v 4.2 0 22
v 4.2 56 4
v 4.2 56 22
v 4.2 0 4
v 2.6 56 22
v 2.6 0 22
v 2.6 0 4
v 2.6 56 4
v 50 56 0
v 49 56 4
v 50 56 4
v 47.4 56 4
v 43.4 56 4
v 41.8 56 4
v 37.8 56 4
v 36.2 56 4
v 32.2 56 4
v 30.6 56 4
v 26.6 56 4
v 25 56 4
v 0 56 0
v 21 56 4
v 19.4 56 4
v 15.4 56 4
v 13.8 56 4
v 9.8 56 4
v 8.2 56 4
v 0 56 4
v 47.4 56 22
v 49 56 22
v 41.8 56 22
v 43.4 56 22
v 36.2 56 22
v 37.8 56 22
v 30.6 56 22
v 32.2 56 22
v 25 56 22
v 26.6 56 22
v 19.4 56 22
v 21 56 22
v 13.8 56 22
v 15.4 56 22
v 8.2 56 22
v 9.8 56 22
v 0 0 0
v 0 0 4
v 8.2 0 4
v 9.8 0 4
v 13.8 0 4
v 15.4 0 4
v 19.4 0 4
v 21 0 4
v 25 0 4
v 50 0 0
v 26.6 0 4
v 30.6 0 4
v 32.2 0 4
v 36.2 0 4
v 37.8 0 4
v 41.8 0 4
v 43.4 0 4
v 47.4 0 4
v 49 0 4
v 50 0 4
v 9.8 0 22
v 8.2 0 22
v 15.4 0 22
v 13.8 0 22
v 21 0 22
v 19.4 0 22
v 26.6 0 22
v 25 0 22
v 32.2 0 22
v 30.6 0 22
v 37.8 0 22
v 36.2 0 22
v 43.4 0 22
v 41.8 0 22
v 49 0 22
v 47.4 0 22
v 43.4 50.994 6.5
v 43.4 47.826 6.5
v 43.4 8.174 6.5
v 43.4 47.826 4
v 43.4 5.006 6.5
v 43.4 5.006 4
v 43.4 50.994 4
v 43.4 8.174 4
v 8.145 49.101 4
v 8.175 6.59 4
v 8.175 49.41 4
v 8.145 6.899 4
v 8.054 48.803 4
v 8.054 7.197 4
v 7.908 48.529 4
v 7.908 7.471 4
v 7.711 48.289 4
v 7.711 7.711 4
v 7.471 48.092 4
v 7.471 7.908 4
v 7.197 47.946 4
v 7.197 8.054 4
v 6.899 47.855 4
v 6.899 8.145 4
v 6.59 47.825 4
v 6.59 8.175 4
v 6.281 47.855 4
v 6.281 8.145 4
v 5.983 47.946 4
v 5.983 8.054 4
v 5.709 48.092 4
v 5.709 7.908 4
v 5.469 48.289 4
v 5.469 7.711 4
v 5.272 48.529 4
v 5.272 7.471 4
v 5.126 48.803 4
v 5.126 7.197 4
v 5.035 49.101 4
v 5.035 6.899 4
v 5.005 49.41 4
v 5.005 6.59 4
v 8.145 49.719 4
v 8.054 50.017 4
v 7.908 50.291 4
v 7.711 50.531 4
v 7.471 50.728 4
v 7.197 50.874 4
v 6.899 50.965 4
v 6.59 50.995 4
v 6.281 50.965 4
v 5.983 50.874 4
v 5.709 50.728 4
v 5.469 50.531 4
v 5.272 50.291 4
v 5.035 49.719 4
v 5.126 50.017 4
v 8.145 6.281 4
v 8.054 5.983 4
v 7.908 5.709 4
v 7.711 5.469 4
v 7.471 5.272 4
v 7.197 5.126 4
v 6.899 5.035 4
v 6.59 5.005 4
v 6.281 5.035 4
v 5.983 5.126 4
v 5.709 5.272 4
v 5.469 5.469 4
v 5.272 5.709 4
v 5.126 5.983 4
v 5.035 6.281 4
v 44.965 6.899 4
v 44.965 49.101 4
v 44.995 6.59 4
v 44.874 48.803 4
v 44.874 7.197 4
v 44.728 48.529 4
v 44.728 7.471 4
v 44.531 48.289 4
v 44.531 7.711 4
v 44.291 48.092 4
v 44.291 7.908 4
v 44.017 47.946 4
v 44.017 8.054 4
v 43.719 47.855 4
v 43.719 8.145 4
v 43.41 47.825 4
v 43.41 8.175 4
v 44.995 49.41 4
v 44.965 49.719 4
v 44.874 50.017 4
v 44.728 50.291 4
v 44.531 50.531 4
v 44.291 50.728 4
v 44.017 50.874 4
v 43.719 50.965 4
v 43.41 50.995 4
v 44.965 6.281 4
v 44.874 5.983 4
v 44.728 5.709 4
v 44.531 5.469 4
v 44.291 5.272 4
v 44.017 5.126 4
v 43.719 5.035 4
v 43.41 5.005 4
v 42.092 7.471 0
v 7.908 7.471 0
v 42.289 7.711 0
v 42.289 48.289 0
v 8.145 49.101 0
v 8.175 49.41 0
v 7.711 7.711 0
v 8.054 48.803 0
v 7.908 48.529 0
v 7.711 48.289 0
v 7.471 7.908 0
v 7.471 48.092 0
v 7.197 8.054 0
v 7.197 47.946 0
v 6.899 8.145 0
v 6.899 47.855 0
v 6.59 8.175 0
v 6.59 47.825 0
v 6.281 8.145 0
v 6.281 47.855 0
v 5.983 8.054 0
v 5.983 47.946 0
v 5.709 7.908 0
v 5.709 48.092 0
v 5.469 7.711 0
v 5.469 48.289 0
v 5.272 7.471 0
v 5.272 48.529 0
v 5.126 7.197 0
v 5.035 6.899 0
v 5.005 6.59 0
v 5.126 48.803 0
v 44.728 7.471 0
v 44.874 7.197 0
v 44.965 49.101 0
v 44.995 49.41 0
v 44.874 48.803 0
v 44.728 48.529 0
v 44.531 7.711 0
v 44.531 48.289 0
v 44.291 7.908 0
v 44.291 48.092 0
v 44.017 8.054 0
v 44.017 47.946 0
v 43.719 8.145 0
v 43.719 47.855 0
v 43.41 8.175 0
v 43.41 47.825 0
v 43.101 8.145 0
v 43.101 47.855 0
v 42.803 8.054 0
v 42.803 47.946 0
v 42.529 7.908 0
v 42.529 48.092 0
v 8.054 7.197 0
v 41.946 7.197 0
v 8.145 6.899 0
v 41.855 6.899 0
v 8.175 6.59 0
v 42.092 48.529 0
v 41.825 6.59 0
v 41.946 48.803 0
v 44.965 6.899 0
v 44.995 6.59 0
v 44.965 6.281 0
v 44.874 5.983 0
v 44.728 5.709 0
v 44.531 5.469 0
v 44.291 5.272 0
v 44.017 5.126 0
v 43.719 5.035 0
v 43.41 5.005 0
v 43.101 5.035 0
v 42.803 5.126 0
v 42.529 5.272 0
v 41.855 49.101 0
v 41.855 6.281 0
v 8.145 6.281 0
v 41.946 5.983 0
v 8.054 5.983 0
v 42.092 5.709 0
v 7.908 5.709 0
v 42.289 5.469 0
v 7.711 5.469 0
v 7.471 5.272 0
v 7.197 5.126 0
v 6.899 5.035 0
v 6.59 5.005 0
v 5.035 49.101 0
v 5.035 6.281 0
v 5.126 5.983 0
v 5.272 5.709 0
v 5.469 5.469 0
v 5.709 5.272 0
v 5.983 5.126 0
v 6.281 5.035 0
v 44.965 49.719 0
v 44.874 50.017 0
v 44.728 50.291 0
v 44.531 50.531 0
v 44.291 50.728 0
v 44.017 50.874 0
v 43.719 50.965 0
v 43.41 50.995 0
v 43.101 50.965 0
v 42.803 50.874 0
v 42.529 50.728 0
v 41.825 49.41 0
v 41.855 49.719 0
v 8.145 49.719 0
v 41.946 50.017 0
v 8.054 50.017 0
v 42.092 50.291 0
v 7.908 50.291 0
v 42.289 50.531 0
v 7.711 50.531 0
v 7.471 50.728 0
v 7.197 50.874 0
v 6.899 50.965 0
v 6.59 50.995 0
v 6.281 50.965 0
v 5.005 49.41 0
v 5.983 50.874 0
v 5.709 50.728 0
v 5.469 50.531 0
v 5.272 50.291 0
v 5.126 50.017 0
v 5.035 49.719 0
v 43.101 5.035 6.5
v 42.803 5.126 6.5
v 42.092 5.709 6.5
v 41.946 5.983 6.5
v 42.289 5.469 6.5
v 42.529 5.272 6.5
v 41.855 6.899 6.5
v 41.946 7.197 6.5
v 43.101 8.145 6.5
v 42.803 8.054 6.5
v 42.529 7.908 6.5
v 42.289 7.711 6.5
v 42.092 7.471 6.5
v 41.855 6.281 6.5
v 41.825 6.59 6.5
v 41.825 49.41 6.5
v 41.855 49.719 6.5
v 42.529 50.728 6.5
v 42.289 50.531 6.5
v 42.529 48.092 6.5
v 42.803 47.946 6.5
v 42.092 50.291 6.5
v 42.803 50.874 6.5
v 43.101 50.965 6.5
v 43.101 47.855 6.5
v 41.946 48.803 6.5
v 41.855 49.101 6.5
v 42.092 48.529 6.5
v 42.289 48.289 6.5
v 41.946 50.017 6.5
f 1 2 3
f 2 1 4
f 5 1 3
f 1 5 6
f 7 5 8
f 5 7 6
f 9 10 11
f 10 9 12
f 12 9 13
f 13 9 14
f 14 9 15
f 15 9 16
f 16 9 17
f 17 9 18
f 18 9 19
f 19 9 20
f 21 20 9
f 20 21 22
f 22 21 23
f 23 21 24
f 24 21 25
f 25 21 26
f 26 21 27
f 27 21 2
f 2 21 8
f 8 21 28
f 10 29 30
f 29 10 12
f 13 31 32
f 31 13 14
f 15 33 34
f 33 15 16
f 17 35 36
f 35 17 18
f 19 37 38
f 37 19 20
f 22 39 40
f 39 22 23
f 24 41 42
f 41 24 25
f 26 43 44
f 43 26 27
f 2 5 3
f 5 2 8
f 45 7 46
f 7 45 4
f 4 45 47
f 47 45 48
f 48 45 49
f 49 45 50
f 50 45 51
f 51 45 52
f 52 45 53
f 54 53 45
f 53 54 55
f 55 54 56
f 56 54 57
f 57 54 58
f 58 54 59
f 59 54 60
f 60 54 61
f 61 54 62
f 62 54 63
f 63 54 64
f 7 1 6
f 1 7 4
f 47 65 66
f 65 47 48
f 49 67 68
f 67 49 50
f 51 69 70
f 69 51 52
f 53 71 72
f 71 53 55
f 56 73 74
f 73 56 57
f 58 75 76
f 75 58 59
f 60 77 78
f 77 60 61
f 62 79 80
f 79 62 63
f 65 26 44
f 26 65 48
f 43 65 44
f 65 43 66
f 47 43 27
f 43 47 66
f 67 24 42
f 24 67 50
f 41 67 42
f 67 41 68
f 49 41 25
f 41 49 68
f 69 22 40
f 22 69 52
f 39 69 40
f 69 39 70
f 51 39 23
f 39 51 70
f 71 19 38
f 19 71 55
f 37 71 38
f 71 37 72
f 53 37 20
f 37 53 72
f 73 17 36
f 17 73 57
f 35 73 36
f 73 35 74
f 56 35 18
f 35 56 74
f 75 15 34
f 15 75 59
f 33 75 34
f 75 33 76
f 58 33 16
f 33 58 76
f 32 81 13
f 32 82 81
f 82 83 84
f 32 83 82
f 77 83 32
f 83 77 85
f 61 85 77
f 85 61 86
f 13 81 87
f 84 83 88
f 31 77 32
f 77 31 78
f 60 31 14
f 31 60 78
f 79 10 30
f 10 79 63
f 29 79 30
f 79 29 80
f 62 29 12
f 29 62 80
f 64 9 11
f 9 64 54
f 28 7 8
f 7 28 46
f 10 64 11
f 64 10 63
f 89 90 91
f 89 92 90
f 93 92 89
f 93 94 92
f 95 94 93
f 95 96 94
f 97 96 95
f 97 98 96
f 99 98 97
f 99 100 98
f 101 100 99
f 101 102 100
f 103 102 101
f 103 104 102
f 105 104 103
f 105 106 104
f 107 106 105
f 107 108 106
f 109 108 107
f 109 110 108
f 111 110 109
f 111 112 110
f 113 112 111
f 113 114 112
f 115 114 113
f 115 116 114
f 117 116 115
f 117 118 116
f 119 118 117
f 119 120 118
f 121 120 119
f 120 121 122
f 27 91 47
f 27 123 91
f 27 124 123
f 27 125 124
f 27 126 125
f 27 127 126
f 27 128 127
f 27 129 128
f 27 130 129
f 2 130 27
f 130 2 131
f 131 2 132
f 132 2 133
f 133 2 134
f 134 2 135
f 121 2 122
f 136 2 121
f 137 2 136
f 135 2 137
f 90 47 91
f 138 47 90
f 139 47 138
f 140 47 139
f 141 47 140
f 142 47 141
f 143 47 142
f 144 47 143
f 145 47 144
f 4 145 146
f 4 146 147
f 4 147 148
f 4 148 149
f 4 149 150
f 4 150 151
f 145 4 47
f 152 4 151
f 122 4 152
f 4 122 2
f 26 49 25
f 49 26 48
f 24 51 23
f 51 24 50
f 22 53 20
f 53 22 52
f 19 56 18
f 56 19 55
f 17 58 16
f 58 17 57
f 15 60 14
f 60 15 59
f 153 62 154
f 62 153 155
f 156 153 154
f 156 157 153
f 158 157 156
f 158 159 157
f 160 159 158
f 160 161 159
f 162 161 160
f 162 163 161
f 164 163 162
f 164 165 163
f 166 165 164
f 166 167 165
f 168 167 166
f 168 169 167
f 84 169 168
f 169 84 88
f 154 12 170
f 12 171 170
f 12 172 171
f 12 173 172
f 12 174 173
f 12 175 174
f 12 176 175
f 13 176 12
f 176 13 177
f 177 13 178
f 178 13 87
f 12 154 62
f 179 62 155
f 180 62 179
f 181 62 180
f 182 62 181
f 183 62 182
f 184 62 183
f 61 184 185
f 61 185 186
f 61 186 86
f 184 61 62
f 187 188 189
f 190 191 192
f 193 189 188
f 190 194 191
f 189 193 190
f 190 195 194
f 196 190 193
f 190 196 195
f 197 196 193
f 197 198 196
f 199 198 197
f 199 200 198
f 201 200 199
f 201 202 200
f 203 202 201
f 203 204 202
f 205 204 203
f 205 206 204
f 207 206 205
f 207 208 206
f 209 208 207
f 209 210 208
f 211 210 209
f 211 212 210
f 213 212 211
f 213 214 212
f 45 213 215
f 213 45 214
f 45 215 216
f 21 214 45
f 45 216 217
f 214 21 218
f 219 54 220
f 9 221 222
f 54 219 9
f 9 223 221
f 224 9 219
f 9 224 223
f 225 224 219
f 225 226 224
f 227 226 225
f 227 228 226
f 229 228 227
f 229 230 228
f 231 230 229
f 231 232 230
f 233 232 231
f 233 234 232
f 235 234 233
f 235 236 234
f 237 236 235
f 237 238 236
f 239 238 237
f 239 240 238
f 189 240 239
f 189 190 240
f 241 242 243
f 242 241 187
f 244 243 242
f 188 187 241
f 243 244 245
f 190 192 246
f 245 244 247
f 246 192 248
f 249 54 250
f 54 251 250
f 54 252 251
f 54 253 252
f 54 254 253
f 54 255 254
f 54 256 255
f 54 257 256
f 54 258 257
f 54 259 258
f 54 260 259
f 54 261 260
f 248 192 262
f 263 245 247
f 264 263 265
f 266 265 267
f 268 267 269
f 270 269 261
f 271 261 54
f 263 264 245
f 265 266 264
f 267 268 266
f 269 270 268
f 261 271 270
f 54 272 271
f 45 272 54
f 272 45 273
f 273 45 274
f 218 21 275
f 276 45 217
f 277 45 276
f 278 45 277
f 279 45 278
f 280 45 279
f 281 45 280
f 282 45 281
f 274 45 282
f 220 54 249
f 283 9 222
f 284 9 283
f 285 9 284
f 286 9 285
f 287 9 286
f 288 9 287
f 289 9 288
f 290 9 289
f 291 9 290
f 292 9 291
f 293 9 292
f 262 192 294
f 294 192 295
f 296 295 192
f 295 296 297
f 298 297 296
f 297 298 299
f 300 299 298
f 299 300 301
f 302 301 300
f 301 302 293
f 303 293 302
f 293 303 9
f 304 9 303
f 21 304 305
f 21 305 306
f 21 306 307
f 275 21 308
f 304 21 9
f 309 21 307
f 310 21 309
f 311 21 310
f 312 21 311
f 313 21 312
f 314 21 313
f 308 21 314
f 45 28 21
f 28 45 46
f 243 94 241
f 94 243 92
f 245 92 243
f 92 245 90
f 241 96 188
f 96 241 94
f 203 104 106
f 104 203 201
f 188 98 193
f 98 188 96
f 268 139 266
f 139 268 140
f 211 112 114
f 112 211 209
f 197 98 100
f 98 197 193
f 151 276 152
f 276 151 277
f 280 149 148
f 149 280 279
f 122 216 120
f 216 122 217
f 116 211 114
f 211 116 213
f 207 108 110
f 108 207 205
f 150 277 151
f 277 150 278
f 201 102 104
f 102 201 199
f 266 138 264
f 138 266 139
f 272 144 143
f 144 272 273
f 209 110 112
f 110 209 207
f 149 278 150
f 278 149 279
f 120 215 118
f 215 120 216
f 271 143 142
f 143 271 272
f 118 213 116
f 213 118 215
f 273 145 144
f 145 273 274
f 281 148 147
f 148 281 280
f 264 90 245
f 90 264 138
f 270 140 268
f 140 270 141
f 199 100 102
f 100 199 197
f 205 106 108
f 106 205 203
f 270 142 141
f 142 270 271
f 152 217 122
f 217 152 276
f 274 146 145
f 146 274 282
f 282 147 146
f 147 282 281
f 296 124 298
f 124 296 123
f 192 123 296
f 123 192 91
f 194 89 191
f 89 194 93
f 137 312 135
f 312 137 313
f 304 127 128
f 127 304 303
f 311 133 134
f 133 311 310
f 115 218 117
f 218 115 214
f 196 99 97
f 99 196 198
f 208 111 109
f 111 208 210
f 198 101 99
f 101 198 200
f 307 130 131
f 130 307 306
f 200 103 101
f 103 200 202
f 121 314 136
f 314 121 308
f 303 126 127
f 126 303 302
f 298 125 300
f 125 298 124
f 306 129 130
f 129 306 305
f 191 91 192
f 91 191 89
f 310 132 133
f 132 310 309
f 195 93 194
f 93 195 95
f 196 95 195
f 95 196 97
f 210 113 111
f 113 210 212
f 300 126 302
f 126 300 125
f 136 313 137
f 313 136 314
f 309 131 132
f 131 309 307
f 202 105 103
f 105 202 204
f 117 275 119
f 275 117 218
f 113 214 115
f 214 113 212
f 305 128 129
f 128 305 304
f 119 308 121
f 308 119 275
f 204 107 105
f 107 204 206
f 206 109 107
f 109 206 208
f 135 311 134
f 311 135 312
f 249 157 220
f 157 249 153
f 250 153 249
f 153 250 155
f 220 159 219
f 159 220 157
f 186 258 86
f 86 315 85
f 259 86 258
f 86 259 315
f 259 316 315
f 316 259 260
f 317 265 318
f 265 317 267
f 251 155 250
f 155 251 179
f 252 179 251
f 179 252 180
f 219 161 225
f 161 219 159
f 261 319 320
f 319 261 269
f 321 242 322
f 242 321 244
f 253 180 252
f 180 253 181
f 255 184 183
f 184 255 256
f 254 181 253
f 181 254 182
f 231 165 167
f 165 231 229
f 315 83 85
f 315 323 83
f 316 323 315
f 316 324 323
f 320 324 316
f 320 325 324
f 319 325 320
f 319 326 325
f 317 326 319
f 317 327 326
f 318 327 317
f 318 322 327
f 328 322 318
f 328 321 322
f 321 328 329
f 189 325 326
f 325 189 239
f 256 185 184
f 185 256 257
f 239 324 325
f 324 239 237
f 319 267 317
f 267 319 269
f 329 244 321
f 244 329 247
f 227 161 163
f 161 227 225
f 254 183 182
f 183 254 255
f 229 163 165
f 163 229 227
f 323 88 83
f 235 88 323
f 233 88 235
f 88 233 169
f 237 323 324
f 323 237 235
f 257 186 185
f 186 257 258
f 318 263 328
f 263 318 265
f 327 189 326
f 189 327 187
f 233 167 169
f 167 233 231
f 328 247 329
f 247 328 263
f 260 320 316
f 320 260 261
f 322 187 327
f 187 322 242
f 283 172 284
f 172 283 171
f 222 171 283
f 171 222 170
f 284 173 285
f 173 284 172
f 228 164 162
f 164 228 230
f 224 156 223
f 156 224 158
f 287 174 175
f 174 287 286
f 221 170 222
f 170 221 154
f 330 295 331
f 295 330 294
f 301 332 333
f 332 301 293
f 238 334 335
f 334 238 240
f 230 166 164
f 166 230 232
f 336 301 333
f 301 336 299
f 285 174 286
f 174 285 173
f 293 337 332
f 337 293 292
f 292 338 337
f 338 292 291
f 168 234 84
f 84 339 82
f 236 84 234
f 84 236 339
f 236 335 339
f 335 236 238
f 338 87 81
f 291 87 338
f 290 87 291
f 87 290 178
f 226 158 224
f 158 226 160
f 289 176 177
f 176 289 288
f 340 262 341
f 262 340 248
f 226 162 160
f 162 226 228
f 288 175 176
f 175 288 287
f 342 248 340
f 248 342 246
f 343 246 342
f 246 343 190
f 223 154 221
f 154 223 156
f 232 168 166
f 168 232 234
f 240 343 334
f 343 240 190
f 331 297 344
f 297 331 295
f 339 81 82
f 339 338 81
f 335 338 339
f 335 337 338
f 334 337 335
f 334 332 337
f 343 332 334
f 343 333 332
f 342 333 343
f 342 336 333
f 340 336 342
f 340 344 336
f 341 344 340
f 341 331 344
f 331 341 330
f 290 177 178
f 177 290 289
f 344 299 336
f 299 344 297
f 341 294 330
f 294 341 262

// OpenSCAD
$fn = 32;

// ----------------------------------------------------------------------
// Finned heat sink: 50 x 56 mm base, 18 mm fins
// ----------------------------------------------------------------------

// --- parameters (mm) ---
base_w = 50;              // base width
base_d = 56;              // base depth
base_t = 4;               // base thickness
fin_h = 18;               // fin height above the base
holes_d = 3.17;           // fixing holes
hole_x = 18.41;           // hole offset in x
hole_y = 21.41;           // hole offset in y
fin_t = 1.6;              // fin thickness
fin_pitch = 5.6;          // fin pitch
fin_count = 9;            // number of fins
fin_x0 = 2.6;             // first fin offset

difference() {
  union() {
    cube([base_w, base_d, base_t]);
    for (i = [0 : fin_count - 1]) {
      translate([fin_x0 + i * fin_pitch, 0, base_t - 0.5]) cube([fin_t, base_d, fin_h + 0.5]);
    }
  }
  /* fixing holes through the base, 2.5 mm clear on both sides */
  for (hx = [-18.41, 18.41]) {
    for (hy = [-21.41, 21.41]) {
      translate([base_w / 2 + hx, base_d / 2 + hy, -2.5]) cylinder(h = base_t + 5, d = holes_d);
    }
  }
}
